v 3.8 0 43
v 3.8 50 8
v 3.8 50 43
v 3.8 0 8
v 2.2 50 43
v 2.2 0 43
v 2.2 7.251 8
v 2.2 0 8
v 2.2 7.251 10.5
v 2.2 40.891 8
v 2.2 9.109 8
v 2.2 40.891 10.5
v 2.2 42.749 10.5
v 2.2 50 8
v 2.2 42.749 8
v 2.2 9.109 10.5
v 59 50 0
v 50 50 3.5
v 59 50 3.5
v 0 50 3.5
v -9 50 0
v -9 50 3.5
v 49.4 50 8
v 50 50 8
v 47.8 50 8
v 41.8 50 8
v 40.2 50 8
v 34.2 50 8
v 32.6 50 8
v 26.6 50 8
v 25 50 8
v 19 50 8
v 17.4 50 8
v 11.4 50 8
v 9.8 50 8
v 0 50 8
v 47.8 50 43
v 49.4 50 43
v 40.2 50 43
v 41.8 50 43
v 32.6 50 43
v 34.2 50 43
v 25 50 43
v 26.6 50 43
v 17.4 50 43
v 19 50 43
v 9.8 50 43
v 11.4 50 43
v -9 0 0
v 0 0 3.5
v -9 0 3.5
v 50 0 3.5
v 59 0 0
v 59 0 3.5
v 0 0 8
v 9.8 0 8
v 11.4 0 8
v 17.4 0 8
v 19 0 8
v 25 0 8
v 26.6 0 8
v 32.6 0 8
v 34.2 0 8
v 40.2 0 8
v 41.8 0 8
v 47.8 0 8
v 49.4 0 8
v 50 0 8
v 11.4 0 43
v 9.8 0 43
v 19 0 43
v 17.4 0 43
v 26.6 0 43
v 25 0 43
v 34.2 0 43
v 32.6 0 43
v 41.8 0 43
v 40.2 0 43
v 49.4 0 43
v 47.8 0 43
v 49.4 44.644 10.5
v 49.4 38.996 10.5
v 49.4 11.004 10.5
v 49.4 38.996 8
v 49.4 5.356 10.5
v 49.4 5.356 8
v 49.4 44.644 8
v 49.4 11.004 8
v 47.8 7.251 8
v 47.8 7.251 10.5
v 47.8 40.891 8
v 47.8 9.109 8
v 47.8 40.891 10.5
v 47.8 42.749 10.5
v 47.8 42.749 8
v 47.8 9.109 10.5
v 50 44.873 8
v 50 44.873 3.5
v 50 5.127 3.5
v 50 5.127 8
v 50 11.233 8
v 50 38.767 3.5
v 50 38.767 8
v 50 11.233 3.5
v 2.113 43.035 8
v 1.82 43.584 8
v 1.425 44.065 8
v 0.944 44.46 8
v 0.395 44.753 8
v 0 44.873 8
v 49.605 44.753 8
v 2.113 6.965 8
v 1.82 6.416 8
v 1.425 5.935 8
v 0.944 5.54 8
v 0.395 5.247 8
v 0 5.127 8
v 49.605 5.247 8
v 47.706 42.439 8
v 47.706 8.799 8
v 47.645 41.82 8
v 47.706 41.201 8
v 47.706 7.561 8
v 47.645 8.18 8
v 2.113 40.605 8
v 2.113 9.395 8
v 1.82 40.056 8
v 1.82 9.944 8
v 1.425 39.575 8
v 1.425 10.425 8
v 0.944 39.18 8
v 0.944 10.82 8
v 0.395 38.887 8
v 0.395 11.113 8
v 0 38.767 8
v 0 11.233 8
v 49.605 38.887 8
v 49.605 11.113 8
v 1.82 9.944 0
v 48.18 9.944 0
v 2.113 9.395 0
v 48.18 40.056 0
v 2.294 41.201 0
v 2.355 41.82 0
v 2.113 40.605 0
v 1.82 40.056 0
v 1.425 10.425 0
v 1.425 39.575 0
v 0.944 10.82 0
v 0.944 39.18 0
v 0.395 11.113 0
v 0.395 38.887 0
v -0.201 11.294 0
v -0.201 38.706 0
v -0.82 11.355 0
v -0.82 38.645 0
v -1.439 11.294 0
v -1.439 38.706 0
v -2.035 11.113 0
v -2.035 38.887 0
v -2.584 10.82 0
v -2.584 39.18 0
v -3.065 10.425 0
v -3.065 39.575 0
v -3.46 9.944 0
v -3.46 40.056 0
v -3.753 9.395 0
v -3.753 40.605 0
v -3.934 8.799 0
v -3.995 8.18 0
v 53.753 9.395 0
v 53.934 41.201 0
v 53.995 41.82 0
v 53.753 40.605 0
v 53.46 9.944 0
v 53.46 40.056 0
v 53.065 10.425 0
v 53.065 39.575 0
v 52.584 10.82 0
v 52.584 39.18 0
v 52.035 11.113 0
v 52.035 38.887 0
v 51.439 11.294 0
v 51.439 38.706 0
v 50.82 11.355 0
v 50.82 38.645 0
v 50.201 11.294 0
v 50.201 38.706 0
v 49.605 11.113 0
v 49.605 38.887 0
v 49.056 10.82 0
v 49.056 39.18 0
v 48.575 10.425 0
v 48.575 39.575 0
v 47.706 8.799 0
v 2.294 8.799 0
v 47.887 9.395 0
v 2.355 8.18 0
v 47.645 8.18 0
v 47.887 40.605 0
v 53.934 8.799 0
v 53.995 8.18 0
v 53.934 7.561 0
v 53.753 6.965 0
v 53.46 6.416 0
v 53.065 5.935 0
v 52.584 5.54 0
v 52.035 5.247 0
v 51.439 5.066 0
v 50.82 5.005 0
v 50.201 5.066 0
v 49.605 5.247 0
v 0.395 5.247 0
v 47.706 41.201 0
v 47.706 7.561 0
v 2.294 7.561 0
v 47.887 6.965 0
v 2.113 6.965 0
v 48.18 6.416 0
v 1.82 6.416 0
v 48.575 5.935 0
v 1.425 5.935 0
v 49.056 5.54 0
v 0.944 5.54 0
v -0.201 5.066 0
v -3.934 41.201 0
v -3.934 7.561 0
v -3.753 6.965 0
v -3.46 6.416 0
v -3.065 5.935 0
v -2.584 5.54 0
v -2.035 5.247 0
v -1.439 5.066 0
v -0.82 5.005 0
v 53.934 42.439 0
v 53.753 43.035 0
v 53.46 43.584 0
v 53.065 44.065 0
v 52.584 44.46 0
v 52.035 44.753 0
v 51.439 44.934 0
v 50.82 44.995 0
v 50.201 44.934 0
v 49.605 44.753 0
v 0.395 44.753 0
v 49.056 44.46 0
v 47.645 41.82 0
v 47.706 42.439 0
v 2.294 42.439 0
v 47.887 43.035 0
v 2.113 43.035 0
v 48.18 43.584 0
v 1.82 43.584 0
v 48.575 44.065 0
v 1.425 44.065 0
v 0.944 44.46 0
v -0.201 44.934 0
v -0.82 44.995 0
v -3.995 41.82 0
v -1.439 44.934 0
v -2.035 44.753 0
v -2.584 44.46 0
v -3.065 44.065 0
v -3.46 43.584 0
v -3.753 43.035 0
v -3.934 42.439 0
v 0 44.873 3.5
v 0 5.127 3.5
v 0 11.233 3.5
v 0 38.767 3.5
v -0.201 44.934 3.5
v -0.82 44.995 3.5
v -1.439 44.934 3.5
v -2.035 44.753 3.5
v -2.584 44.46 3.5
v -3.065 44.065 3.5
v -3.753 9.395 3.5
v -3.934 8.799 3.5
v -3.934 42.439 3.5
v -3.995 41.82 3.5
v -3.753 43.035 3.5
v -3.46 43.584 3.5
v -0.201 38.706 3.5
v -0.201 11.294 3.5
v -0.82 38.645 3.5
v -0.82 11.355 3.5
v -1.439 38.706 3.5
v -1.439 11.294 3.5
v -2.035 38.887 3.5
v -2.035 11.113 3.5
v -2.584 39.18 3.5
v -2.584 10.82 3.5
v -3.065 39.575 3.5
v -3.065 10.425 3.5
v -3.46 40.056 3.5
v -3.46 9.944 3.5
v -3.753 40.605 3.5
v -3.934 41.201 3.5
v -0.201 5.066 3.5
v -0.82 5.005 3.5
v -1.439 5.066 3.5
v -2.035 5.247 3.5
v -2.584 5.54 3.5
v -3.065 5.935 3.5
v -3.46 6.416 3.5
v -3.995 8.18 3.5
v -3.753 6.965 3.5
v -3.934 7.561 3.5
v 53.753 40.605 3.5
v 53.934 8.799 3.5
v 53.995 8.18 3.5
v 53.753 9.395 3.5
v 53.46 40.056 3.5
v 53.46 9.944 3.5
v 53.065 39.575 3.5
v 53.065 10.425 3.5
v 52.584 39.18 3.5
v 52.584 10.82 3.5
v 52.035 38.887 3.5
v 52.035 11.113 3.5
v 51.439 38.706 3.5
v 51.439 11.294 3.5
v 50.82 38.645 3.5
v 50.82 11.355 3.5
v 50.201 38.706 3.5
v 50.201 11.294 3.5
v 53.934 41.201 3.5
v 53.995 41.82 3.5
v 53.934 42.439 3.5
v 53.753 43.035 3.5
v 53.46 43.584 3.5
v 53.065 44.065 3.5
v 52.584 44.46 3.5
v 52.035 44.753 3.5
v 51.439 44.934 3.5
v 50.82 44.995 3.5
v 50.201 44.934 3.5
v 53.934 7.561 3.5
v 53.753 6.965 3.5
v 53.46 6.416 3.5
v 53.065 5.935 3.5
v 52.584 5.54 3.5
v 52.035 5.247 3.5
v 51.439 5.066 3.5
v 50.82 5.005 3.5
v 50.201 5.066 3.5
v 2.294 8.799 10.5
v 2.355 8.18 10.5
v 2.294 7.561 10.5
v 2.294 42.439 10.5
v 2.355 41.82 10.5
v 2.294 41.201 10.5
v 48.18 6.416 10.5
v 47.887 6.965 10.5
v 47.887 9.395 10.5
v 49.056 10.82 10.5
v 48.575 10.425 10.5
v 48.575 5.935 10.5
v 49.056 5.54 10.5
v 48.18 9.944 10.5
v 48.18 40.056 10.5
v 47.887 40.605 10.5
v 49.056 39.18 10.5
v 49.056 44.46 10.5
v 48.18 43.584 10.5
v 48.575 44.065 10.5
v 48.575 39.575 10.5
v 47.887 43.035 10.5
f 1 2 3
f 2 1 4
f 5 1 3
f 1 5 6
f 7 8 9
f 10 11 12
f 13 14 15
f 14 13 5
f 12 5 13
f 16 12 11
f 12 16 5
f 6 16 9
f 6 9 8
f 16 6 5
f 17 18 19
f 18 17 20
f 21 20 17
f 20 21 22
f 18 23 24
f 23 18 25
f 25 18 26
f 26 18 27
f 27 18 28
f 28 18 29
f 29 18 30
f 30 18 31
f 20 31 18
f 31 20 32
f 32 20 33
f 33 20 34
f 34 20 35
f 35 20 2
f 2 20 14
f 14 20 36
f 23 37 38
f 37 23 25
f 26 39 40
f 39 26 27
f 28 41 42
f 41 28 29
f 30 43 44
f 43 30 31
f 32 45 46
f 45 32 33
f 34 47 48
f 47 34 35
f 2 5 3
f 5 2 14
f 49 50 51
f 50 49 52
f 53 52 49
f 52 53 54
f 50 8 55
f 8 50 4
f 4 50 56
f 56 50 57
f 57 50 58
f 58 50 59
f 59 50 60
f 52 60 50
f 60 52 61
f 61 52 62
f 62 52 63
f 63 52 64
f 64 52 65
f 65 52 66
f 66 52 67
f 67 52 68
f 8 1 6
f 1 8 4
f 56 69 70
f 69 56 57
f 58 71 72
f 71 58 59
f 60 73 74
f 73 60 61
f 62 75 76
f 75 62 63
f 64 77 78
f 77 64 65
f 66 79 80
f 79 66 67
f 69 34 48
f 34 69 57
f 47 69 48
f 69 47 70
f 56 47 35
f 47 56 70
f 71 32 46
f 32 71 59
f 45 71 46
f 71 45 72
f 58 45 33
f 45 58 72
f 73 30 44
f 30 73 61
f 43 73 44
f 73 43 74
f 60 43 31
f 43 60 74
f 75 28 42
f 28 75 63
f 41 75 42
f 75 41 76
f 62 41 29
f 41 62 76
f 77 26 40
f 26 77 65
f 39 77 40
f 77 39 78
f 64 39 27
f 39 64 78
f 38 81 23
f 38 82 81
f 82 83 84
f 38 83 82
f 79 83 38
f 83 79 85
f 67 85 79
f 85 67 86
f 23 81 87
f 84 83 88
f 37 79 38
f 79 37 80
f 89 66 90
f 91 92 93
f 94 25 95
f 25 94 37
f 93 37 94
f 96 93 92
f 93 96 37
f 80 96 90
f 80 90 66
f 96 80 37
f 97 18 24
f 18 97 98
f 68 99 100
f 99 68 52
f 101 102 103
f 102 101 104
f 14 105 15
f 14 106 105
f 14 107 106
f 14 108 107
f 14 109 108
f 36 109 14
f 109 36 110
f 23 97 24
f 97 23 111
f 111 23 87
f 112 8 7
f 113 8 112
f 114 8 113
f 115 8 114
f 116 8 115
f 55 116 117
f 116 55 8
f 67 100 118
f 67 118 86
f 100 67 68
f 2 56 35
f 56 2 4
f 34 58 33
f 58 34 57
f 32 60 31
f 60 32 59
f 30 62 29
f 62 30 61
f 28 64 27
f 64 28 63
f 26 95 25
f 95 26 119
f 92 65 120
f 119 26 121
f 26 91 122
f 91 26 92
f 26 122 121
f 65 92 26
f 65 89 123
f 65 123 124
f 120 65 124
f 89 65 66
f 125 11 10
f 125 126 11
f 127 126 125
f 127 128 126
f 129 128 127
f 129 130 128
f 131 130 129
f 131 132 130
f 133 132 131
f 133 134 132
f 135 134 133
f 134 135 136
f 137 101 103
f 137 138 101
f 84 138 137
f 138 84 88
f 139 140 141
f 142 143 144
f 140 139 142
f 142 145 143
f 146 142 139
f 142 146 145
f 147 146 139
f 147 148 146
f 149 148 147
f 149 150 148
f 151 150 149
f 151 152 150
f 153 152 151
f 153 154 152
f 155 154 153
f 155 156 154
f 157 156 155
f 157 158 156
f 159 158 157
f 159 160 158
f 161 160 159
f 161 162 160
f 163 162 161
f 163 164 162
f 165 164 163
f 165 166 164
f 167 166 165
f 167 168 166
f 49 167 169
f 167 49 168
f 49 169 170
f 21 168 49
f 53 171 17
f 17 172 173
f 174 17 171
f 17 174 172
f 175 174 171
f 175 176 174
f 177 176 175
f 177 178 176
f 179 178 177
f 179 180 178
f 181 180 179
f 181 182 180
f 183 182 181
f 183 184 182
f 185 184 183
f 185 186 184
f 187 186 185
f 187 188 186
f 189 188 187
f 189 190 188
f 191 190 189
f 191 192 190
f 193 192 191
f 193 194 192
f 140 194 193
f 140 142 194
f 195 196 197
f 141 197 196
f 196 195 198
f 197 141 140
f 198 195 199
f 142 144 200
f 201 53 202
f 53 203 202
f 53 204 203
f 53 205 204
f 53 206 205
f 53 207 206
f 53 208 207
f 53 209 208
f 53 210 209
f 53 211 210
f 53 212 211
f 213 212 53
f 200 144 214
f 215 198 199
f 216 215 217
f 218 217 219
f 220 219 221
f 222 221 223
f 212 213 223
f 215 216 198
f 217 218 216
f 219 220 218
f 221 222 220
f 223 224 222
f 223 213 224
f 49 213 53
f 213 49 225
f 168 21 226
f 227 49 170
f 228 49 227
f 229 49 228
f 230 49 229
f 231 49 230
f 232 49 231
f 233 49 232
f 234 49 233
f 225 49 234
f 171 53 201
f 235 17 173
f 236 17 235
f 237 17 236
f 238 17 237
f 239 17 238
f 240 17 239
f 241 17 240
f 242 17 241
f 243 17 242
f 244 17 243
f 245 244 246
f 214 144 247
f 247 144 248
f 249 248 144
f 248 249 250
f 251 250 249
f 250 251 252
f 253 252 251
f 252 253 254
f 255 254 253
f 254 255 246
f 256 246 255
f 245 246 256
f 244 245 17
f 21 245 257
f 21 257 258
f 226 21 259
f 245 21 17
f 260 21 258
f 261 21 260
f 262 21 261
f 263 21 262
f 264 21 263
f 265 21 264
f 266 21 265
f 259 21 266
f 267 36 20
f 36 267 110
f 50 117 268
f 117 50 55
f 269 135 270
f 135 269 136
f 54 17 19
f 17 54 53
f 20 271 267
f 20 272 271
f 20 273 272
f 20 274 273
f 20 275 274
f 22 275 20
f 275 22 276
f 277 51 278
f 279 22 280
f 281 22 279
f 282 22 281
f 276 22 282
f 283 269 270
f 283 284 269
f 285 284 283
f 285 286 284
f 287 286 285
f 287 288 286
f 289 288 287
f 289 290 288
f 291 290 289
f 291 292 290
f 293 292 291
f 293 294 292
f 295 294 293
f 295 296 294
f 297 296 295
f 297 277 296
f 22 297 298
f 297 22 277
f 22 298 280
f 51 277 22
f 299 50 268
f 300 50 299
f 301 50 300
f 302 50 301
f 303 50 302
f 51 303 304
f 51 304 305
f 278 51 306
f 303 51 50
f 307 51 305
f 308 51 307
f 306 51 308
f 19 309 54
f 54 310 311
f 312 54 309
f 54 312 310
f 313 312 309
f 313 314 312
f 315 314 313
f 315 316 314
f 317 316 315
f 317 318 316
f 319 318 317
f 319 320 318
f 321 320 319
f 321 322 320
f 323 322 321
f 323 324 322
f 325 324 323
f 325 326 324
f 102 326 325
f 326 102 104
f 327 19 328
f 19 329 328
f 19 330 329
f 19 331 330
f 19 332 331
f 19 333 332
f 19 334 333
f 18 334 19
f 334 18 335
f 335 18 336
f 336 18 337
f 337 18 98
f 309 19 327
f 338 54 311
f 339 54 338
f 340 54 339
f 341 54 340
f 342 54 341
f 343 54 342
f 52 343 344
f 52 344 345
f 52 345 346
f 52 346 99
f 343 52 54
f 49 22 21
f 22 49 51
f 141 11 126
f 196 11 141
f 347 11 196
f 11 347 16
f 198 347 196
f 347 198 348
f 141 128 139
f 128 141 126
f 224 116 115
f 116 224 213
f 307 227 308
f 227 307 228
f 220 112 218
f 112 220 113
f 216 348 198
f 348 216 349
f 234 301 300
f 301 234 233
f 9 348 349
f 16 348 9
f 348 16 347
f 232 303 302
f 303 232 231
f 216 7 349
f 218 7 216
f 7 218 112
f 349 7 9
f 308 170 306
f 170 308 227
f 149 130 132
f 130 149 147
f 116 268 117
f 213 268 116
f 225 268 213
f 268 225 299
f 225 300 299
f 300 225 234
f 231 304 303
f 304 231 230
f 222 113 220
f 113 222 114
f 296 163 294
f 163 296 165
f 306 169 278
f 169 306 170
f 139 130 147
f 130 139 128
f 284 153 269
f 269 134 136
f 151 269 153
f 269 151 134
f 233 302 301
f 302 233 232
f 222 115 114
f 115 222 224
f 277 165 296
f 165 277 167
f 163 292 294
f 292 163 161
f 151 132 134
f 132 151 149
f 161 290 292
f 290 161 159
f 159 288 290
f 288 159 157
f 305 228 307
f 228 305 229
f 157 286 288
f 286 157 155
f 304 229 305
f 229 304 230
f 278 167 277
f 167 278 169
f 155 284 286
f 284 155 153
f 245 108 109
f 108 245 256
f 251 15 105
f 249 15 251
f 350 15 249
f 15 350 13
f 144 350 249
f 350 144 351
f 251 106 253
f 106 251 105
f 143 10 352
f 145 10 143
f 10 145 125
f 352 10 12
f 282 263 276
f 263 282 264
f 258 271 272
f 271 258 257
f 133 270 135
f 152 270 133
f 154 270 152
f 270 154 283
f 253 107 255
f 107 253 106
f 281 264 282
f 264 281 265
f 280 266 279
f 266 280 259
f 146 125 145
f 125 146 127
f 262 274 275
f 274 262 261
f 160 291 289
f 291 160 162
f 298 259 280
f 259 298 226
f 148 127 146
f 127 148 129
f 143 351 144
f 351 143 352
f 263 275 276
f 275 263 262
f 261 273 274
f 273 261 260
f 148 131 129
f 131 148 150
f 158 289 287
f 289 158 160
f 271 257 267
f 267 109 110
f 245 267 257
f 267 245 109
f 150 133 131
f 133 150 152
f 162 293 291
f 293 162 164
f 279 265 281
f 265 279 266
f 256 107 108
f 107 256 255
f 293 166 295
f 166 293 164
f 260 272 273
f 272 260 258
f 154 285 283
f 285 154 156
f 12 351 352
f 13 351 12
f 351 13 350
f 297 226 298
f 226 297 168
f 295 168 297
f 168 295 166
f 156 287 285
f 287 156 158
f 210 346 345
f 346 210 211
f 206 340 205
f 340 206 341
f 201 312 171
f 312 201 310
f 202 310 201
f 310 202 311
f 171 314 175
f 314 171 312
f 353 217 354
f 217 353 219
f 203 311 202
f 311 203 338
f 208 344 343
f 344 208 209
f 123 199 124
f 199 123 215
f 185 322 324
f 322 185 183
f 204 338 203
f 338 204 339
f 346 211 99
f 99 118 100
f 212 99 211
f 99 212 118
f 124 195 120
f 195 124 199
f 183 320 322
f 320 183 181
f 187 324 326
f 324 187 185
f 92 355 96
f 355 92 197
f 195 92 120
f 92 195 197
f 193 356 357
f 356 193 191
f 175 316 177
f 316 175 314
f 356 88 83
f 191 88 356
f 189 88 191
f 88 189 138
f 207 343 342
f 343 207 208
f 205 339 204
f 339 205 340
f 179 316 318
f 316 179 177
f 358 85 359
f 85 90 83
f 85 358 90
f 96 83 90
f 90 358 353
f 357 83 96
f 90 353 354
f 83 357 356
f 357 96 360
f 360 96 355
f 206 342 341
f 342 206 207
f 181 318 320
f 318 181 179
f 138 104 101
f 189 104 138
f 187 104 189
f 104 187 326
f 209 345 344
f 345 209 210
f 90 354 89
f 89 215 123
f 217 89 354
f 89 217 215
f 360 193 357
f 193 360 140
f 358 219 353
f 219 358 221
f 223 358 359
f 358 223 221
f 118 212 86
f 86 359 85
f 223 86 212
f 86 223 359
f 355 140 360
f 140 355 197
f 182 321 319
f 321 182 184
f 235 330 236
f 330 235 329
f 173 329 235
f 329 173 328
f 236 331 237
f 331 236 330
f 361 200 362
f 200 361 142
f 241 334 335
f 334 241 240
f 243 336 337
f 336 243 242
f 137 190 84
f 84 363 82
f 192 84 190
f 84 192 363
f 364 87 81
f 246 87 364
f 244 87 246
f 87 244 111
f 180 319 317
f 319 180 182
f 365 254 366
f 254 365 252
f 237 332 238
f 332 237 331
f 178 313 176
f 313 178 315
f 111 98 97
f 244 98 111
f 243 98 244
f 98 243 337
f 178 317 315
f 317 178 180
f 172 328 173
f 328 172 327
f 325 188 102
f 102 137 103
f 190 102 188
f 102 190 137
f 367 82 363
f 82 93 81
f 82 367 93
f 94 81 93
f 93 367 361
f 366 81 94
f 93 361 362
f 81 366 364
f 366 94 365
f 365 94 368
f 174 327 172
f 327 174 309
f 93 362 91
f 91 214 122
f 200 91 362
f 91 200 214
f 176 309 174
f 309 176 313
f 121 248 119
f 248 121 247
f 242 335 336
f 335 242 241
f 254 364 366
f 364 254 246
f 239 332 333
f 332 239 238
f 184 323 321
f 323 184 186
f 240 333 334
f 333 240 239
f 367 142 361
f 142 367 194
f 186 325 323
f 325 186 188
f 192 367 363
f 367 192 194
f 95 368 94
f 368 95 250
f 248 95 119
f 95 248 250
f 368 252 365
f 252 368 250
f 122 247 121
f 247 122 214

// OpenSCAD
$fn = 32;

// ----------------------------------------------------------------------
// Finned heat sink: 50 x 50 mm base, 35 mm fins
// ----------------------------------------------------------------------

// --- parameters (mm) ---
base_w = 50;              // base width
base_d = 50;              // base depth
base_t = 8;               // base thickness
fin_h = 35;               // fin height above the base
holes_d = 6.35;           // fixing holes
hole_x = 25.82;           // hole offset in x
hole_y = 16.82;           // hole offset in y
fin_t = 1.6;              // fin thickness
fin_pitch = 7.6;          // fin pitch
fin_count = 7;            // number of fins
fin_x0 = 2.2;             // first fin offset
flange_w = 68;            // flange plate width
flange_t = 3;             // flange plate thickness

difference() {
  union() {
    cube([base_w, base_d, base_t]);
    for (i = [0 : fin_count - 1]) {
      translate([fin_x0 + i * fin_pitch, 0, base_t - 0.5]) cube([fin_t, base_d, fin_h + 0.5]);
    }
    /* mounting flange, a wider plate sharing the base bottom */
    translate([(base_w - flange_w) / 2, 0, 0]) cube([flange_w, base_d, flange_t + 0.5]);
  }
  /* fixing holes through the base, 2.5 mm clear on both sides */
  for (hx = [-25.82, 25.82]) {
    for (hy = [-16.82, 16.82]) {
      translate([base_w / 2 + hx, base_d / 2 + hy, -2.5]) cylinder(h = base_t + 5, d = holes_d);
    }
  }
}
